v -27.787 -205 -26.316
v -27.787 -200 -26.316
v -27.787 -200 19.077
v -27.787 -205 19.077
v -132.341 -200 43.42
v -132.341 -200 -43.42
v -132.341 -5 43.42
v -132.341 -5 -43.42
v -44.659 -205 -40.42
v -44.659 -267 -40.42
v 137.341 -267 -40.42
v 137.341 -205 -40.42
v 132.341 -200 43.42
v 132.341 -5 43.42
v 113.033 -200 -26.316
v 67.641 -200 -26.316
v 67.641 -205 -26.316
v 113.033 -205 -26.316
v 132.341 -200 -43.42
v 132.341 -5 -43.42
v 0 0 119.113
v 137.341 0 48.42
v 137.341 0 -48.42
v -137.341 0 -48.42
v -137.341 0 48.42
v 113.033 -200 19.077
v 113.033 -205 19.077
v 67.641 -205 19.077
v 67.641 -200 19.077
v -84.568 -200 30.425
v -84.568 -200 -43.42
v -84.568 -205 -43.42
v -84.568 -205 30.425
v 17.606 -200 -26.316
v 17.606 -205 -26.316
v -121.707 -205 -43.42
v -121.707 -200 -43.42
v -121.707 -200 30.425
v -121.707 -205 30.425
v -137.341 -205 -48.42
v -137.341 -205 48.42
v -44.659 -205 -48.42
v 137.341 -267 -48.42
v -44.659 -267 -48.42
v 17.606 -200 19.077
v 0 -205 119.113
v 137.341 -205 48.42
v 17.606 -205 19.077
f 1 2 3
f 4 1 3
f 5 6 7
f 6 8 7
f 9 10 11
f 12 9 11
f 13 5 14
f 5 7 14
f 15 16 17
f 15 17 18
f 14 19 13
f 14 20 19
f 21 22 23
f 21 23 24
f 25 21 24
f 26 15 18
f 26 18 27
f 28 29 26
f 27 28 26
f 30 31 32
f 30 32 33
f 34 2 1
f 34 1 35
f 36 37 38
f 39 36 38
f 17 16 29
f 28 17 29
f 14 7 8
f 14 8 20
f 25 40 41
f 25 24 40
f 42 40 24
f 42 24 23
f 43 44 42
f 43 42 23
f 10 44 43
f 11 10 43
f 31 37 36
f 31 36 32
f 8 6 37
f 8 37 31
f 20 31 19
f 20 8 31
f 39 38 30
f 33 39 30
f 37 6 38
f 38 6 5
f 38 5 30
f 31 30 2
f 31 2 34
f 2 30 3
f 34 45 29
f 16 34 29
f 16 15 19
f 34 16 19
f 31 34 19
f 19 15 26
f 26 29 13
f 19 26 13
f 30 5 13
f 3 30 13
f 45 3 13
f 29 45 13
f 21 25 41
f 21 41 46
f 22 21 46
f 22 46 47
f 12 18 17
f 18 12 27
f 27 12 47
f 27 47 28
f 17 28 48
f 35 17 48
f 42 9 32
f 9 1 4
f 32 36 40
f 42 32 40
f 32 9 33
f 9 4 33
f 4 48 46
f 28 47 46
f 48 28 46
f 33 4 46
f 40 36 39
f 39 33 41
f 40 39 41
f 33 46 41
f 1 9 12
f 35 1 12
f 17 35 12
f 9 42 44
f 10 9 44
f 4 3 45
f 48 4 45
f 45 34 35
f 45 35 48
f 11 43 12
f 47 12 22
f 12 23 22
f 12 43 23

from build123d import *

# Parameters (mm, degrees)
F0_W     = 274.682402
F0_H     = 96.840292
F1_DEPTH = 200
F2_T     = -5
F3_W     = 274.682402
F3_H     = 96.840292
F3_W_2   = 37.139356
F3_H_2   = 73.845126
F3_W_3   = 45.392542
F3_H_3   = 45.392544
F3_W_4   = 45.392528
F4_DEPTH = 5
F6_DEPTH = 205
F7_W     = 182
F7_H     = 62
F8_DEPTH = 8


with BuildPart() as f1:
    # F0 (on Front) → F1 (new body)
    with BuildSketch(Plane.XZ):
        Rectangle(F0_W, F0_H)
    extrude(amount=F1_DEPTH)

    # F2
    f2_openings = [f1.faces().sort_by_distance(p)[0] for p in [
        (0, -200, 0),
    ]]
    offset(amount=F2_T, openings=f2_openings)

    # F3 (on face) → F4 (join)
    with BuildSketch(Plane.XZ.offset(200)):
        Rectangle(F3_W, F3_H)
        with Locations((-103.137672, -6.497583)):
            Rectangle(F3_W_2, F3_H_2, mode=Mode.SUBTRACT)
        with Locations((-5.090558, -3.619425)):
            Rectangle(F3_W_3, F3_H_3, mode=Mode.SUBTRACT)
        with Locations((90.336949, -3.619425)):
            Rectangle(F3_W_4, F3_H_3, mode=Mode.SUBTRACT)
    extrude(amount=F4_DEPTH)

    # F5 (on face) → F6 (join)
    with BuildSketch(Plane(origin=(0, 0, 0), x_dir=(-1, 0, 0), z_dir=(0, 1, 0))):
        Polygon((0, 119.112626), (-137.341201, 48.420146), (137.341201, 48.420146), align=None)
    extrude(amount=-F6_DEPTH)

    # F7 (on face) → F8 (join)
    with BuildSketch(Plane(origin=(0, 0, -48.420146), x_dir=(1, 0, 0), z_dir=(0, 0, -1))):
        with Locations((46.341201, 236)):
            Rectangle(F7_W, F7_H)
    extrude(amount=-F8_DEPTH)


solid = f1.part
